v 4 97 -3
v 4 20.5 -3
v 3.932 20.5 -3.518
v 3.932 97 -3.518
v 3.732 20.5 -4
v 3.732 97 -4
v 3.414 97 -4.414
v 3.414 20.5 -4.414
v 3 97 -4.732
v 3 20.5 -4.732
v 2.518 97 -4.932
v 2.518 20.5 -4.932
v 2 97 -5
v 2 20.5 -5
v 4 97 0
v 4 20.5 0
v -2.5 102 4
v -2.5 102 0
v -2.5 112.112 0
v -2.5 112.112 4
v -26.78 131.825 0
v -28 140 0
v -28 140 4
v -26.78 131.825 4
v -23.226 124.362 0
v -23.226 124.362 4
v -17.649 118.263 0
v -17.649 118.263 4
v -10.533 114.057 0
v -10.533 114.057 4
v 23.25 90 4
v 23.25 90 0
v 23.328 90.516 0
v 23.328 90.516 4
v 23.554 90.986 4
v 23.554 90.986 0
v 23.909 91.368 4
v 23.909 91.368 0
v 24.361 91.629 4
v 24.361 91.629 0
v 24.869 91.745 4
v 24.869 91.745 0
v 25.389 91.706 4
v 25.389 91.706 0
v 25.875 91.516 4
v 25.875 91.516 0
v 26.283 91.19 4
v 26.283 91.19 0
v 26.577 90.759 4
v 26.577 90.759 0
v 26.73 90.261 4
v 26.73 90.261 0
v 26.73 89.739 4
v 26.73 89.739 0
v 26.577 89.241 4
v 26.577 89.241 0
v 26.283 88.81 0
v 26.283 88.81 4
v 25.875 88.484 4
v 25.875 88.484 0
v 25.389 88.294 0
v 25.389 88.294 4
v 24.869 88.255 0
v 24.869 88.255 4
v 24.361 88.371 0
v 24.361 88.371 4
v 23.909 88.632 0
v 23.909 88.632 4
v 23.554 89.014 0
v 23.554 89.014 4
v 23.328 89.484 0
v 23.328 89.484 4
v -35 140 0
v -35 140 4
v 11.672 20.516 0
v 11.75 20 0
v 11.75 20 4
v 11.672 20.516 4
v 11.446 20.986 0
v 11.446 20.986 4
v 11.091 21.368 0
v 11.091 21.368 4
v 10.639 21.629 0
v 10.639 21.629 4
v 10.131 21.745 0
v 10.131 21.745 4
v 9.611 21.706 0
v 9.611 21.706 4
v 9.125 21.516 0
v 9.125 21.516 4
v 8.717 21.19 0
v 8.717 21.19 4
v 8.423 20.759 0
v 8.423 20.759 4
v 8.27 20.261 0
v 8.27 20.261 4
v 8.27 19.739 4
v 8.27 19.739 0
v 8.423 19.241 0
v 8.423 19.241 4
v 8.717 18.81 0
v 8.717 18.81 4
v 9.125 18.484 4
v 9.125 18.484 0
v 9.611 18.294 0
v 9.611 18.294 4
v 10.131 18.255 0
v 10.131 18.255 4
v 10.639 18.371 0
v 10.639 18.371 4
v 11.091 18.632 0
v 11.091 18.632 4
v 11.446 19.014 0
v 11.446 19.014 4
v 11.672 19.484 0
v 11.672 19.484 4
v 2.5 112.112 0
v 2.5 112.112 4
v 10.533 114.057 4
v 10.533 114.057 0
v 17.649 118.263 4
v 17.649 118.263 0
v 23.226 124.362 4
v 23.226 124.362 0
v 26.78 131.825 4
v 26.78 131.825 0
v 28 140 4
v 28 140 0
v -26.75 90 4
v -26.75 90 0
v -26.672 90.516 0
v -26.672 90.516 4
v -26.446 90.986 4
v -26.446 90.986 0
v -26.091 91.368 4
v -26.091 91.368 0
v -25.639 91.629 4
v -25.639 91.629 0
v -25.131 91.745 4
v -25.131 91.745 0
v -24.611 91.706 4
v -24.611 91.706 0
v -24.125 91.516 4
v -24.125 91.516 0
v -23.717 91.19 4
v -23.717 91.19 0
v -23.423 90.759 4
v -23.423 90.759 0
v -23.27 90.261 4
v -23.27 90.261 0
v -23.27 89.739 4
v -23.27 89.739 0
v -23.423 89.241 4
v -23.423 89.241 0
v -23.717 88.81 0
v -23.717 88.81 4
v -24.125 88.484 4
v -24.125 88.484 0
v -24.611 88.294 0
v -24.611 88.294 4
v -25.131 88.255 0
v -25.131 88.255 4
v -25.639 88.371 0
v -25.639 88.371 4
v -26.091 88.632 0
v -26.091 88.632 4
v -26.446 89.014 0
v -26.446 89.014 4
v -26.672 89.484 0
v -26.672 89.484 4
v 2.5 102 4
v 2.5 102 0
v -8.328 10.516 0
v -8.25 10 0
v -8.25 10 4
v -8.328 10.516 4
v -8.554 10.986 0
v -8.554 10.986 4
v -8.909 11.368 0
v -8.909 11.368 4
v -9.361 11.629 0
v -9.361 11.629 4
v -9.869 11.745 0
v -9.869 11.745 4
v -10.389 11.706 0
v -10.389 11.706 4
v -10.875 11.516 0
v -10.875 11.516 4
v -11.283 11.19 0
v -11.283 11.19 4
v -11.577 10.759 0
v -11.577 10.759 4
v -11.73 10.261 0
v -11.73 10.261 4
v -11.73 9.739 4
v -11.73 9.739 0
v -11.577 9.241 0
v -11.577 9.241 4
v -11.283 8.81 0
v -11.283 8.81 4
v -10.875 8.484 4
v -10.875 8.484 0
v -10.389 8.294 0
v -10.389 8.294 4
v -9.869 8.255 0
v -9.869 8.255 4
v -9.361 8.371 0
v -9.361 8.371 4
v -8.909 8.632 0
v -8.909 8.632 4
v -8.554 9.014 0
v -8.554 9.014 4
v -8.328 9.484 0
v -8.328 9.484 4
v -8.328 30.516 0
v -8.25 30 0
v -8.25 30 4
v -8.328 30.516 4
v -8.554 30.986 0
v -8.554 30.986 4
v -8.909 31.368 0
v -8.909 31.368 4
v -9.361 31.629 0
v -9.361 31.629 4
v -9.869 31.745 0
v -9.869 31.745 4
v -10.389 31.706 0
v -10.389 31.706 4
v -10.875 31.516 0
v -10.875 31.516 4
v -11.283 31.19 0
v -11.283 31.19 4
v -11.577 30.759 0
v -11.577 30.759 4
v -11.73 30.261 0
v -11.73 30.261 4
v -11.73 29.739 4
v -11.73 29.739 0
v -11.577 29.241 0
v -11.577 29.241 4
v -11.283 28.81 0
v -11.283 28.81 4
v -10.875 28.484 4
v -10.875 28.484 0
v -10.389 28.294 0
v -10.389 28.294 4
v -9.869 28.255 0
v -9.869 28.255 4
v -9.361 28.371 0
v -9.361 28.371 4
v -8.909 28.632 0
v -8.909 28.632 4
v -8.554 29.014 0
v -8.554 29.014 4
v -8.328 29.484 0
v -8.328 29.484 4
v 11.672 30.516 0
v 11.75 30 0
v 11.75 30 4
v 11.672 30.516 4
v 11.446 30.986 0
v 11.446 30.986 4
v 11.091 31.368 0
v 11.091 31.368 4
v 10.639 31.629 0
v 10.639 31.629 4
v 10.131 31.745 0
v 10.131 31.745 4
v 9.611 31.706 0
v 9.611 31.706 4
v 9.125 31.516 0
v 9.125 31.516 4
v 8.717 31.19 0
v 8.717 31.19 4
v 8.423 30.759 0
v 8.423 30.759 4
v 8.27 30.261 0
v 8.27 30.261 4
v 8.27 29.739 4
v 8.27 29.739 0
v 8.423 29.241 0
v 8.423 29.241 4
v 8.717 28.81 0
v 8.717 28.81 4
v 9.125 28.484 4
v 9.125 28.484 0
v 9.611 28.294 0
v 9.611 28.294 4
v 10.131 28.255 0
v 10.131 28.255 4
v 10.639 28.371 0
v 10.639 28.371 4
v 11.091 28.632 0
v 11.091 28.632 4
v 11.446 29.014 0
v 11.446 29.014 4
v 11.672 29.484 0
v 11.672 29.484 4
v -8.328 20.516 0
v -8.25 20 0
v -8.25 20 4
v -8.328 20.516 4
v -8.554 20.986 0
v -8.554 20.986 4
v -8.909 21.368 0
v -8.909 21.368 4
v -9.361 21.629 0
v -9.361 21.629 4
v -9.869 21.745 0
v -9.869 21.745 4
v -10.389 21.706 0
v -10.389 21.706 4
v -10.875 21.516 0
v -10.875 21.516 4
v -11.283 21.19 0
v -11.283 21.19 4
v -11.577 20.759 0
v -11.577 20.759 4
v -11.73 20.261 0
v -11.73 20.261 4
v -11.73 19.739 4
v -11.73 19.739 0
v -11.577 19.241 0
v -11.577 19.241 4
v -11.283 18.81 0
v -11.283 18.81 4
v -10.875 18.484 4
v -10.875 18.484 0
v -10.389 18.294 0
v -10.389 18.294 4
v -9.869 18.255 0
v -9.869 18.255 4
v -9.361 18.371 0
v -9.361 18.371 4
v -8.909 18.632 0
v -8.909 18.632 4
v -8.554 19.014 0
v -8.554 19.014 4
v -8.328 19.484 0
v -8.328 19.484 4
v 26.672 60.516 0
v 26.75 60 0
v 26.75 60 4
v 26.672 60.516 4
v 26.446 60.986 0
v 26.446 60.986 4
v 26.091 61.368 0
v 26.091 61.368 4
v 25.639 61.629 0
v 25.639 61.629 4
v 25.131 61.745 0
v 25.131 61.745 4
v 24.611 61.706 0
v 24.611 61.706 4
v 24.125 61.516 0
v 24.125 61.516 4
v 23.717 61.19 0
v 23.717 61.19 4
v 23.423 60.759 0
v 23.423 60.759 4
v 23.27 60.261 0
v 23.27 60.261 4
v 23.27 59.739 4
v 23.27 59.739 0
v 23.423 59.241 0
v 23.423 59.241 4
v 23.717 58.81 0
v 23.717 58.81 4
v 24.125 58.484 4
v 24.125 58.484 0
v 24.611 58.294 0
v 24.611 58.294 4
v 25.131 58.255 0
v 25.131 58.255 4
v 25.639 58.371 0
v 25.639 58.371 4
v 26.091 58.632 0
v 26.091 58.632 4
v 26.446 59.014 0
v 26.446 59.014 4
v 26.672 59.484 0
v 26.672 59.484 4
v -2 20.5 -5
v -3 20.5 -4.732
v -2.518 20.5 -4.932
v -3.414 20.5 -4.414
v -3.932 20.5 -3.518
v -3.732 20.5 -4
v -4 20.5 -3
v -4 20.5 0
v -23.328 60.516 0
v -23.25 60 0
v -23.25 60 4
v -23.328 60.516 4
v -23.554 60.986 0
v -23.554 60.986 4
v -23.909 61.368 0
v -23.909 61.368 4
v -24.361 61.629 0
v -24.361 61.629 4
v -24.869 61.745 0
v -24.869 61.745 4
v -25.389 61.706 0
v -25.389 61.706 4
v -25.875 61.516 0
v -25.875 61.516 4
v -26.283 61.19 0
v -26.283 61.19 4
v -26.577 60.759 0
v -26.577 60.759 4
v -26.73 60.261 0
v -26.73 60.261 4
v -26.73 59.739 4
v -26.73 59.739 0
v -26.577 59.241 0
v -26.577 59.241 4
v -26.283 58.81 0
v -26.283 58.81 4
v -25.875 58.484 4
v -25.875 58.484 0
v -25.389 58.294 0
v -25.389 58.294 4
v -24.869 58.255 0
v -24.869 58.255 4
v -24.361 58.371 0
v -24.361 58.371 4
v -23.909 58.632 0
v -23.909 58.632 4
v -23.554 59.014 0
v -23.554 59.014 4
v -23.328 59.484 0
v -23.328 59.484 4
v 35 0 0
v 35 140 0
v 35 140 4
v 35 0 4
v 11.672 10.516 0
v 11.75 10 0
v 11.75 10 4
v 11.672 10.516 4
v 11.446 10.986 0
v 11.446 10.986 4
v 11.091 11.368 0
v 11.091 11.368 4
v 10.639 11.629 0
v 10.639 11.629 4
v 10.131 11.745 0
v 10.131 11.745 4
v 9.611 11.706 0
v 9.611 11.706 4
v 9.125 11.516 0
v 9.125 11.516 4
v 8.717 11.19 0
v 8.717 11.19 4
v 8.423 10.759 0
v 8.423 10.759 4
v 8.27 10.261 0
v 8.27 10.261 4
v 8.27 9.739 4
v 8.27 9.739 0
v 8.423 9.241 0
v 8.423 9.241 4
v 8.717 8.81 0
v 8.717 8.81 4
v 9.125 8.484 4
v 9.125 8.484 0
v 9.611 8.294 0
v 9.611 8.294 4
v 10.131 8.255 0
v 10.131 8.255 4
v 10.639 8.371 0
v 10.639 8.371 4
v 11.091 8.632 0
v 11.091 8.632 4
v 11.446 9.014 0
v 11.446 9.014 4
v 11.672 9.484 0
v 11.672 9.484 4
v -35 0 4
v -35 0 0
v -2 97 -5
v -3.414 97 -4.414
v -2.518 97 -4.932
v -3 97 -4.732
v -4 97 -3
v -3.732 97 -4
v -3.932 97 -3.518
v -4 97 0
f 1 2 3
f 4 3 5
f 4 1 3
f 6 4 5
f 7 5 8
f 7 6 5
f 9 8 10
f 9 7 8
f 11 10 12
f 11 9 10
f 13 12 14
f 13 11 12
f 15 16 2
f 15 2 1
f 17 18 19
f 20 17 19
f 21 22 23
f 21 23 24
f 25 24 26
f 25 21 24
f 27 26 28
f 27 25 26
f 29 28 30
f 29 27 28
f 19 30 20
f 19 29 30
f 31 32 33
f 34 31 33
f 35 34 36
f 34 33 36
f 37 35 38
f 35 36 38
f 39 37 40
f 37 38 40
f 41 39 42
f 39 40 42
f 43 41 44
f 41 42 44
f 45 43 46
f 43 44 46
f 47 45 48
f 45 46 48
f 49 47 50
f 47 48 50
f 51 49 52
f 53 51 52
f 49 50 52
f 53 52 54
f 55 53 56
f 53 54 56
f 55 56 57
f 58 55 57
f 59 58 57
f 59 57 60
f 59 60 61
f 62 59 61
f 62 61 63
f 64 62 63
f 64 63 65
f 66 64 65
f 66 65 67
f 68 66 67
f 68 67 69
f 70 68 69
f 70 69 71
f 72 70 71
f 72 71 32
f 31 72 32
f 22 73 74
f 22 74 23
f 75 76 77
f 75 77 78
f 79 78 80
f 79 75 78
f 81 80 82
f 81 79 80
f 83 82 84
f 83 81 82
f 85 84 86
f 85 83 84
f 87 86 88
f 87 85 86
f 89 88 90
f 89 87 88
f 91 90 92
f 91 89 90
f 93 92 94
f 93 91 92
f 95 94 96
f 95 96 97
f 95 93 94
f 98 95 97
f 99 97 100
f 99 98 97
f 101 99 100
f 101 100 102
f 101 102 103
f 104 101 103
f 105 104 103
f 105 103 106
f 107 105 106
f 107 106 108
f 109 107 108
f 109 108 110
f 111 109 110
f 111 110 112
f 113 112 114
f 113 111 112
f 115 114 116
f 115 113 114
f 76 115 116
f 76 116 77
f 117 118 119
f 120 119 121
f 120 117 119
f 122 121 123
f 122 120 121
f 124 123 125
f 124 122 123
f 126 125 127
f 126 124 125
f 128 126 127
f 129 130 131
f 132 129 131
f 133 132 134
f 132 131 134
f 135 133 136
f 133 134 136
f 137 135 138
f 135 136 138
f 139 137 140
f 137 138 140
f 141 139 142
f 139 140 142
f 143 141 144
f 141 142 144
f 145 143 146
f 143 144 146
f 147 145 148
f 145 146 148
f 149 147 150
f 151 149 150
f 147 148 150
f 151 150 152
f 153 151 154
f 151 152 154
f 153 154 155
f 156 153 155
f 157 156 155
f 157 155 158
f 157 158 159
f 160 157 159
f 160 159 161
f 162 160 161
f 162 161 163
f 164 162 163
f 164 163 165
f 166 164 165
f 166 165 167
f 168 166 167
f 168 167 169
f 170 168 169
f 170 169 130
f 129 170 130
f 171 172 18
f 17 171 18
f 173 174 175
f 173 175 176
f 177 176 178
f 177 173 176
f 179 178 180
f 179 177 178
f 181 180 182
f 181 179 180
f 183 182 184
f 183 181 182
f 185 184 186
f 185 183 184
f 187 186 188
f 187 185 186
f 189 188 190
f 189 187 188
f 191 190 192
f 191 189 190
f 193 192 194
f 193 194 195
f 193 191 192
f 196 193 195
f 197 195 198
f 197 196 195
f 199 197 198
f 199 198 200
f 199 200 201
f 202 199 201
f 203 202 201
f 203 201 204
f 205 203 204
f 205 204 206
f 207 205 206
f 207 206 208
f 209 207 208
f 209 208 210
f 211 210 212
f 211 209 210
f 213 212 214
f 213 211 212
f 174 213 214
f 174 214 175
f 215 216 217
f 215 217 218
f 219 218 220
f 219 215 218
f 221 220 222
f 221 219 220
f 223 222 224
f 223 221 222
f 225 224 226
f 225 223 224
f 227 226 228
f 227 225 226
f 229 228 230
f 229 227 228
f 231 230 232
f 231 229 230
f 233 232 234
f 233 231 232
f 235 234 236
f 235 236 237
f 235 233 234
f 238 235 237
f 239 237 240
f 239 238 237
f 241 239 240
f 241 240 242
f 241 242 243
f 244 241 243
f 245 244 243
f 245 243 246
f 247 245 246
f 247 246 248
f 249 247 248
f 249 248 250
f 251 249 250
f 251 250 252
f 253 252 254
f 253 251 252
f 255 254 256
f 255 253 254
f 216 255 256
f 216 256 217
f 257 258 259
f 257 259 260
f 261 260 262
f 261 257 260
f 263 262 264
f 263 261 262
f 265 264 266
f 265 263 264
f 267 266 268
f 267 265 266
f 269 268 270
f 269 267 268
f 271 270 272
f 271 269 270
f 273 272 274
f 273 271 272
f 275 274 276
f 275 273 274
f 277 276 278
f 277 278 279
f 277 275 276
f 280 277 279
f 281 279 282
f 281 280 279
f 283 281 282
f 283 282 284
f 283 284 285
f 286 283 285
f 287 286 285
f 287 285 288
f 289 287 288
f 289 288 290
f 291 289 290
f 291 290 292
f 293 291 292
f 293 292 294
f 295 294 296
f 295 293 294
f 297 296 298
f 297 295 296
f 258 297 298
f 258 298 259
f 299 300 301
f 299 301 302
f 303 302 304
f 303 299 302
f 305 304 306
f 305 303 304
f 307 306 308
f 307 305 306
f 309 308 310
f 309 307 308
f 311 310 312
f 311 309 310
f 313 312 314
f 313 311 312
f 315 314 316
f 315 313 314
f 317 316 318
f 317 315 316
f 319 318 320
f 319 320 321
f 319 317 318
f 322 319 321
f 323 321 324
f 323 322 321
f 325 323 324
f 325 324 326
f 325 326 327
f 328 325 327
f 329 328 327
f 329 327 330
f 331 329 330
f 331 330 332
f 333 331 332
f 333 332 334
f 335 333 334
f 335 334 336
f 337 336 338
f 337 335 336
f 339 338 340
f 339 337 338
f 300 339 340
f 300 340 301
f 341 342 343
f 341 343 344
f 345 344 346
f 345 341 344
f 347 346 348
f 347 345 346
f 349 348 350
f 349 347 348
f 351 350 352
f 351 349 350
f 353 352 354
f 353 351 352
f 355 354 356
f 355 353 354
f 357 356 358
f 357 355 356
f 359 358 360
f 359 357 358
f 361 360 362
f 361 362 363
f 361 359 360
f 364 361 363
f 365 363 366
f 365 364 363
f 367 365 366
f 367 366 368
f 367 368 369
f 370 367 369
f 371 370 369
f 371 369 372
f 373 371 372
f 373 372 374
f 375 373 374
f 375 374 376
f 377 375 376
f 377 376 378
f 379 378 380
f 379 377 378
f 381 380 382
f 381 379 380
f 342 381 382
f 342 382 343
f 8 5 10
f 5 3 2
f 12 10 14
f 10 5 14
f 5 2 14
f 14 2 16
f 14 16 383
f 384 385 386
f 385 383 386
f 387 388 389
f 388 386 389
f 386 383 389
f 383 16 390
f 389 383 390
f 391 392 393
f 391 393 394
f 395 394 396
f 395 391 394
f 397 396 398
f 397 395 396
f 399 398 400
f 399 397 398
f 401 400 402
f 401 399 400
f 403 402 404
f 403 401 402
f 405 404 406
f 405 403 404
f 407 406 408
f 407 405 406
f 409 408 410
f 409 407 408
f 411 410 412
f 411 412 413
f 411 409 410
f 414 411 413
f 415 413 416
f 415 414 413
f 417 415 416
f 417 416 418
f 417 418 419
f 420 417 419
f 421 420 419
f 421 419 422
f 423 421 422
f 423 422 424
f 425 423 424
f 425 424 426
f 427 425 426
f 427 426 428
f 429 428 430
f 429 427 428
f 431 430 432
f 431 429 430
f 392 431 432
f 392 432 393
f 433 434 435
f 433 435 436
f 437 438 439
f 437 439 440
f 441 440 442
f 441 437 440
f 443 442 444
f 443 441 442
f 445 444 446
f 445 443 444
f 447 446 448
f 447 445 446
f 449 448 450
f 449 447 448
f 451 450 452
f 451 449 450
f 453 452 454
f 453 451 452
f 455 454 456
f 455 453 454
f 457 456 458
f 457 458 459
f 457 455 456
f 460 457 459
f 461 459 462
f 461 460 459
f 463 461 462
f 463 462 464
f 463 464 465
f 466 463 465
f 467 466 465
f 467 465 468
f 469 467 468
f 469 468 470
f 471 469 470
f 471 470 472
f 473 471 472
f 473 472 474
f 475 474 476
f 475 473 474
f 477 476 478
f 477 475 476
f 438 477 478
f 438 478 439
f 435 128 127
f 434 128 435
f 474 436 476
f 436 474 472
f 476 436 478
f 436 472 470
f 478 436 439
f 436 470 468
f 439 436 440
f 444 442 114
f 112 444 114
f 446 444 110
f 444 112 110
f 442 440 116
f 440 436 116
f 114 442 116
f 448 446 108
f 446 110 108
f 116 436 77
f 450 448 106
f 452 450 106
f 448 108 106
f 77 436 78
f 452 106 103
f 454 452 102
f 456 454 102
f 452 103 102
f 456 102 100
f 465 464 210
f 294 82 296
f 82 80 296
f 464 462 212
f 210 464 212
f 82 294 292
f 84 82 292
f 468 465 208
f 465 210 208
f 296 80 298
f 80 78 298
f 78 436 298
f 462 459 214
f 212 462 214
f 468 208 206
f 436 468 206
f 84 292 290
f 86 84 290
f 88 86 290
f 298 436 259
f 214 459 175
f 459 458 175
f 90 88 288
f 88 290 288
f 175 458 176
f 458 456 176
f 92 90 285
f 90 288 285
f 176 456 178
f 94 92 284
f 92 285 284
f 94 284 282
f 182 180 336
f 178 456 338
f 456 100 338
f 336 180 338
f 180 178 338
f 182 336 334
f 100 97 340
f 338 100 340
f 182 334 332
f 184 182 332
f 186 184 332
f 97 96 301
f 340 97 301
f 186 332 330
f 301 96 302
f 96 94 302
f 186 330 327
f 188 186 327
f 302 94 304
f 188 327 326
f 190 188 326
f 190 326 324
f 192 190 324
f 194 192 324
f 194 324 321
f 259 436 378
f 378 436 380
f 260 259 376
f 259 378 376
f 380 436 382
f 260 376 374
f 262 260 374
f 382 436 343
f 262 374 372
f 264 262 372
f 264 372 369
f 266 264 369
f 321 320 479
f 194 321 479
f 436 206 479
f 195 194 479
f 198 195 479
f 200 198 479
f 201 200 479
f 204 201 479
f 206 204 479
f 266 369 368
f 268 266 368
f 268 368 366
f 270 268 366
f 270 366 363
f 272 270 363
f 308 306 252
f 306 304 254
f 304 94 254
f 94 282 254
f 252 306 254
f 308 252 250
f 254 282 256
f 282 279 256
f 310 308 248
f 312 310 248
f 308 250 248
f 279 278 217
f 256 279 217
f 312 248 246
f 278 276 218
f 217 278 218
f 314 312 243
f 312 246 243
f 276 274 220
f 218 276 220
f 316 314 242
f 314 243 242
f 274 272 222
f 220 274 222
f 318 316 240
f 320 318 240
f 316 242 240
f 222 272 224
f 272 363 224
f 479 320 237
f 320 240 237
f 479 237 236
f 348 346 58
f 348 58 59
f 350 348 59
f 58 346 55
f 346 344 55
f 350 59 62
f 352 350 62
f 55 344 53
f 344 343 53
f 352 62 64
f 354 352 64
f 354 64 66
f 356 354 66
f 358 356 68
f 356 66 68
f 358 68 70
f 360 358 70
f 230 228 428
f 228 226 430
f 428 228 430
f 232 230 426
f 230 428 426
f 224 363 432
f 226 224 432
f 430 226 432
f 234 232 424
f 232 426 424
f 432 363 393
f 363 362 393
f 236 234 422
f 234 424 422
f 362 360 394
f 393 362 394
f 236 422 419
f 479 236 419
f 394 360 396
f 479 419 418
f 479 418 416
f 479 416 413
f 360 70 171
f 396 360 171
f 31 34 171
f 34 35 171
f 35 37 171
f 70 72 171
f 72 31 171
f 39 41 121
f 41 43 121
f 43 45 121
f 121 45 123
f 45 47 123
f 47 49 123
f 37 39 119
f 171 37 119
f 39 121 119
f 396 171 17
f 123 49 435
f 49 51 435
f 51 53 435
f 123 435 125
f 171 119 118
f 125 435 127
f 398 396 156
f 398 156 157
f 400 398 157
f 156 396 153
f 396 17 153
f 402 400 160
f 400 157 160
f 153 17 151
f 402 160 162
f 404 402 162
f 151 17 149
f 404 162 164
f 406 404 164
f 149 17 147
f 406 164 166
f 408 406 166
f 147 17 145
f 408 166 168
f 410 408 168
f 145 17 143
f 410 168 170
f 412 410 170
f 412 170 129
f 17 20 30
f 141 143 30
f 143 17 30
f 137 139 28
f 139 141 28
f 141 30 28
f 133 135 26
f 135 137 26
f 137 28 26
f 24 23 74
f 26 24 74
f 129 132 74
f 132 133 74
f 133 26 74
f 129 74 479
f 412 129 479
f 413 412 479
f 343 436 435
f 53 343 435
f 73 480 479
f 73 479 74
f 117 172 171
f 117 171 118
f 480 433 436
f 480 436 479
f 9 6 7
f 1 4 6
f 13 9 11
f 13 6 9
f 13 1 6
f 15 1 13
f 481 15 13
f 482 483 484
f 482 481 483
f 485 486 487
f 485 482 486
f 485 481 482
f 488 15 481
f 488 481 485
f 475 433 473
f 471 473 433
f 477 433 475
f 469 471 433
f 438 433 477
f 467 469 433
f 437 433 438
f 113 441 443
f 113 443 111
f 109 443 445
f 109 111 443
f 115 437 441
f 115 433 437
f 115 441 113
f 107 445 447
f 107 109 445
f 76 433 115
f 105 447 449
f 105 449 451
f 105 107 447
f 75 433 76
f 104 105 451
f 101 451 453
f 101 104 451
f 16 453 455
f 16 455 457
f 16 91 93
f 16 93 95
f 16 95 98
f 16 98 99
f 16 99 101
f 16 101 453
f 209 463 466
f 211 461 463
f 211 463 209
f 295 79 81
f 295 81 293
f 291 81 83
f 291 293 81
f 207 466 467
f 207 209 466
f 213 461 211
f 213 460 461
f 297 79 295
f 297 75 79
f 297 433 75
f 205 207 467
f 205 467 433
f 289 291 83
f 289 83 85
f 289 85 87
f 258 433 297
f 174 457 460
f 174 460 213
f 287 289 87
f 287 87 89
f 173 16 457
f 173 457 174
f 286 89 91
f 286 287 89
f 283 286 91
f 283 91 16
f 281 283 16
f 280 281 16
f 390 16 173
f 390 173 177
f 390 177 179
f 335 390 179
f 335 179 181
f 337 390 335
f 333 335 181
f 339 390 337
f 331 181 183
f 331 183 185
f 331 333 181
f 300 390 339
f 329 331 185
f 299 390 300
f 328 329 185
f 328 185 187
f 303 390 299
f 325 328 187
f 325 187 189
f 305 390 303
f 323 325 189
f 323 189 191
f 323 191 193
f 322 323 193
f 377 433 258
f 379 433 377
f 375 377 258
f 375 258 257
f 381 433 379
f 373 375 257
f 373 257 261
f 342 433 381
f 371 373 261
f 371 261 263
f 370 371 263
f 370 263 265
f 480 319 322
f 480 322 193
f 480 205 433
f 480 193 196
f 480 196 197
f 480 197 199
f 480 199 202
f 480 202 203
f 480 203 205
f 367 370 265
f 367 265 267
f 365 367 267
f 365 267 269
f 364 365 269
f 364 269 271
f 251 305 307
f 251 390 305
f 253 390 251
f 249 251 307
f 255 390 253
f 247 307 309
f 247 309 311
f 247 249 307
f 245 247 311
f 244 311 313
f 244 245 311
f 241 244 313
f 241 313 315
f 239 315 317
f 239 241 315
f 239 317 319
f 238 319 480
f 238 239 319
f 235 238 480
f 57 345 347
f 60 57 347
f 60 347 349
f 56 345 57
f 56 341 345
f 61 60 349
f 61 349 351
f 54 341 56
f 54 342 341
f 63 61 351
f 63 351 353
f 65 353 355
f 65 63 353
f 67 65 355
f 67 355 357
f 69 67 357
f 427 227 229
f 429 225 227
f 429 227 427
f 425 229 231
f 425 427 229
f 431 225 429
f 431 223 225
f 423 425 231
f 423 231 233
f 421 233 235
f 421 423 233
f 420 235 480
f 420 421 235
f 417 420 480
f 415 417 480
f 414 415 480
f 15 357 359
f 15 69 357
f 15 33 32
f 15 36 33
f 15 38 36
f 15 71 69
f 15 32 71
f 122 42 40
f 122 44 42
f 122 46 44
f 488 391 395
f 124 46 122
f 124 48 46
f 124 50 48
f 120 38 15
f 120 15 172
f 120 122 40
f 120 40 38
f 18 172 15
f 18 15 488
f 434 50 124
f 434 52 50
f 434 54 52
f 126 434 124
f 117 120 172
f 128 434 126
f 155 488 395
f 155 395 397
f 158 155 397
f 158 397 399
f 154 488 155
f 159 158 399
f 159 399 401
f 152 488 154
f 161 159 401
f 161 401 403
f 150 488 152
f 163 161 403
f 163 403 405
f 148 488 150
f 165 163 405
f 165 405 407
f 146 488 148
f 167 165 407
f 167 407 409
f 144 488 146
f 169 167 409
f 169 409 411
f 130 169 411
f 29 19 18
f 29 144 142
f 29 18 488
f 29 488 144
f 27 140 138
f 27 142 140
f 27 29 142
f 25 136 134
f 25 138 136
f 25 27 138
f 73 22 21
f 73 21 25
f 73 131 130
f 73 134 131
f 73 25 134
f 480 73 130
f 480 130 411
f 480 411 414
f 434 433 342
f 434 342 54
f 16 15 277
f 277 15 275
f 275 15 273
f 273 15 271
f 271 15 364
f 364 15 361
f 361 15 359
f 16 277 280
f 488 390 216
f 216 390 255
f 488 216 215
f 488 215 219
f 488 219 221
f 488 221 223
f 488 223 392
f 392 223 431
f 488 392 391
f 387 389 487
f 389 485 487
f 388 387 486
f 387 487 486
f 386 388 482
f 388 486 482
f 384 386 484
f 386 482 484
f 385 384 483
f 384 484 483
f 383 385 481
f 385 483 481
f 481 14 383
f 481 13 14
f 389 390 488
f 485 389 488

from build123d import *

# Parameters (mm, degrees)
SKETCH1_R           = 1.75
BOSS_EXTRUDE1_DEPTH = 4
SKETCH2_W           = 5
SKETCH2_H           = 38
CUT_EXTRUDE1_DEPTH  = 145.364122967
SKETCH3_W           = 8
SKETCH3_H           = 76.5
BOSS_EXTRUDE2_DEPTH = 5
FILLET1_R           = 2
SKETCH4_R           = 1.75
CUT_EXTRUDE2_DEPTH  = 145.395290782


with BuildPart() as part:
    # Sketch1 → Boss-Extrude1 (new body)
    with BuildSketch(Plane.XY):
        with BuildLine():
            Line((-35, 140), (-28, 140))
            ThreePointArc((-28, 140), (0, 112), (28, 140))
            Line((28, 140), (35, 140))
            Line((35, 140), (35, 0))
            Line((35, 0), (-35, 0))
            Line((-35, 0), (-35, 140))
        make_face()
        with Locations((-25, 60)):
            Circle(SKETCH1_R, mode=Mode.SUBTRACT)
        with Locations((25, 60)):
            Circle(SKETCH1_R, mode=Mode.SUBTRACT)
        with Locations((-10, 10)):
            Circle(SKETCH1_R, mode=Mode.SUBTRACT)
        with Locations((10, 10)):
            Circle(SKETCH1_R, mode=Mode.SUBTRACT)
        with Locations((-10, 20)):
            Circle(SKETCH1_R, mode=Mode.SUBTRACT)
        with Locations((10, 20)):
            Circle(SKETCH1_R, mode=Mode.SUBTRACT)
        with Locations((-10, 30)):
            Circle(SKETCH1_R, mode=Mode.SUBTRACT)
        with Locations((10, 30)):
            Circle(SKETCH1_R, mode=Mode.SUBTRACT)
    extrude(amount=BOSS_EXTRUDE1_DEPTH)

    # Sketch2 → Cut-Extrude1 (cut, through all)
    with BuildSketch(Plane(origin=(0, 0, 0), x_dir=(-1, 0, 0), z_dir=(0, 0, -1))):
        with Locations((0, 121)):
            Rectangle(SKETCH2_W, SKETCH2_H)
    extrude(amount=-CUT_EXTRUDE1_DEPTH, mode=Mode.SUBTRACT)

    # Sketch3 → Boss-Extrude2 (add)
    with BuildSketch(Plane(origin=(0, 0, 0), x_dir=(-1, 0, 0), z_dir=(0, 0, -1))):
        with Locations((0, 58.75)):
            Rectangle(SKETCH3_W, SKETCH3_H)
    extrude(amount=BOSS_EXTRUDE2_DEPTH)

    # Fillet1
    fillet1_edges = [part.edges().sort_by_distance(p)[0] for p in [
        (4, 58.75, -5),
        (-4, 58.75, -5),
    ]]
    fillet(fillet1_edges, radius=FILLET1_R)

    # Sketch4 → Cut-Extrude2 (cut, through all)
    with BuildSketch(Plane(origin=(0, 0, 0), x_dir=(-1, 0, 0), z_dir=(0, 0, -1))):
        with Locations((-25, 90)):
            Circle(SKETCH4_R)
        with Locations((25, 90)):
            Circle(SKETCH4_R)
    extrude(amount=-CUT_EXTRUDE2_DEPTH, mode=Mode.SUBTRACT)


solid = part.part
